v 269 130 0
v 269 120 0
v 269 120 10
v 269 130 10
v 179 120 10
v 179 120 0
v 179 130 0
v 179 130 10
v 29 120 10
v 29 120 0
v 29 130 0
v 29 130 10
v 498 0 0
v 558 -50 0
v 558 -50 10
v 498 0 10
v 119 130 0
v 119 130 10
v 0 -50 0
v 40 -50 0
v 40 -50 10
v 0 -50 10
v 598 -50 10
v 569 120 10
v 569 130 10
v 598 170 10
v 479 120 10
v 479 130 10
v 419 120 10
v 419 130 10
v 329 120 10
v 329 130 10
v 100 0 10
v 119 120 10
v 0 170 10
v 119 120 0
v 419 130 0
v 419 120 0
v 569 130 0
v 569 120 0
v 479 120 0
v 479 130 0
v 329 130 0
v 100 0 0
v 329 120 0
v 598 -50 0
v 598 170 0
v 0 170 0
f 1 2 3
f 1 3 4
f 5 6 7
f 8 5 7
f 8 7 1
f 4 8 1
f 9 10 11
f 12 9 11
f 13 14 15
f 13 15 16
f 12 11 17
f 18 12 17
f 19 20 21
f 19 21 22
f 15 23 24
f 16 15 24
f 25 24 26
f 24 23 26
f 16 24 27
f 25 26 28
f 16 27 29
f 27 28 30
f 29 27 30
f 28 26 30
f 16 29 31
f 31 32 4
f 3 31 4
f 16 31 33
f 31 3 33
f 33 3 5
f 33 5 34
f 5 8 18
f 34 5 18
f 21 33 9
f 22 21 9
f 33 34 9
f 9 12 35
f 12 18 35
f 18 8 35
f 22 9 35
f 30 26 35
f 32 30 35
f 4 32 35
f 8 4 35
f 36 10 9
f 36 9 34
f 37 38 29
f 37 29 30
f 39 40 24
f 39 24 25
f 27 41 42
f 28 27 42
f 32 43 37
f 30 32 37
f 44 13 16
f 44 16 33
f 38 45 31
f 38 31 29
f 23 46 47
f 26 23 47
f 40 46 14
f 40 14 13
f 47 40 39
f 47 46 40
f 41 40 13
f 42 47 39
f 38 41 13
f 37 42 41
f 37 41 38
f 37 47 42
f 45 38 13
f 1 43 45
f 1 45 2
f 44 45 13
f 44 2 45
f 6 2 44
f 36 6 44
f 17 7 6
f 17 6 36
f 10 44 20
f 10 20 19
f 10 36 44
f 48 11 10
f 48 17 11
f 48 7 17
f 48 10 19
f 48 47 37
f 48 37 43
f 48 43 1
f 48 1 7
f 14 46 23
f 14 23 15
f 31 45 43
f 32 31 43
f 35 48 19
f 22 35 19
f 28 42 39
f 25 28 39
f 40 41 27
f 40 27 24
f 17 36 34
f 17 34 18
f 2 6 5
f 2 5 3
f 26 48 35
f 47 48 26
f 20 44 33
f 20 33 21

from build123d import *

# Parameters (mm, degrees)
ESQUISSE1_W        = 90
ESQUISSE1_H        = 10
BOSS_EXTRU_1_DEPTH = 10


with BuildPart() as part:
    # Esquisse1 → Boss.-Extru.1 (new body)
    with BuildSketch(Plane.XY):
        Polygon((0, 170), (598, 170), (598, 0), (598, -50), (558, -50), (498, 0), (100, 0), (40, -50), (0, -50), (0, 0), align=None)
        with Locations((224, 125)):
            Rectangle(ESQUISSE1_W, ESQUISSE1_H, mode=Mode.SUBTRACT)
        with Locations((374, 125)):
            Rectangle(ESQUISSE1_W, ESQUISSE1_H, mode=Mode.SUBTRACT)
        with Locations((74, 125)):
            Rectangle(ESQUISSE1_W, ESQUISSE1_H, mode=Mode.SUBTRACT)
        with Locations((524, 125)):
            Rectangle(ESQUISSE1_W, ESQUISSE1_H, mode=Mode.SUBTRACT)
    extrude(amount=BOSS_EXTRU_1_DEPTH)


solid = part.part
